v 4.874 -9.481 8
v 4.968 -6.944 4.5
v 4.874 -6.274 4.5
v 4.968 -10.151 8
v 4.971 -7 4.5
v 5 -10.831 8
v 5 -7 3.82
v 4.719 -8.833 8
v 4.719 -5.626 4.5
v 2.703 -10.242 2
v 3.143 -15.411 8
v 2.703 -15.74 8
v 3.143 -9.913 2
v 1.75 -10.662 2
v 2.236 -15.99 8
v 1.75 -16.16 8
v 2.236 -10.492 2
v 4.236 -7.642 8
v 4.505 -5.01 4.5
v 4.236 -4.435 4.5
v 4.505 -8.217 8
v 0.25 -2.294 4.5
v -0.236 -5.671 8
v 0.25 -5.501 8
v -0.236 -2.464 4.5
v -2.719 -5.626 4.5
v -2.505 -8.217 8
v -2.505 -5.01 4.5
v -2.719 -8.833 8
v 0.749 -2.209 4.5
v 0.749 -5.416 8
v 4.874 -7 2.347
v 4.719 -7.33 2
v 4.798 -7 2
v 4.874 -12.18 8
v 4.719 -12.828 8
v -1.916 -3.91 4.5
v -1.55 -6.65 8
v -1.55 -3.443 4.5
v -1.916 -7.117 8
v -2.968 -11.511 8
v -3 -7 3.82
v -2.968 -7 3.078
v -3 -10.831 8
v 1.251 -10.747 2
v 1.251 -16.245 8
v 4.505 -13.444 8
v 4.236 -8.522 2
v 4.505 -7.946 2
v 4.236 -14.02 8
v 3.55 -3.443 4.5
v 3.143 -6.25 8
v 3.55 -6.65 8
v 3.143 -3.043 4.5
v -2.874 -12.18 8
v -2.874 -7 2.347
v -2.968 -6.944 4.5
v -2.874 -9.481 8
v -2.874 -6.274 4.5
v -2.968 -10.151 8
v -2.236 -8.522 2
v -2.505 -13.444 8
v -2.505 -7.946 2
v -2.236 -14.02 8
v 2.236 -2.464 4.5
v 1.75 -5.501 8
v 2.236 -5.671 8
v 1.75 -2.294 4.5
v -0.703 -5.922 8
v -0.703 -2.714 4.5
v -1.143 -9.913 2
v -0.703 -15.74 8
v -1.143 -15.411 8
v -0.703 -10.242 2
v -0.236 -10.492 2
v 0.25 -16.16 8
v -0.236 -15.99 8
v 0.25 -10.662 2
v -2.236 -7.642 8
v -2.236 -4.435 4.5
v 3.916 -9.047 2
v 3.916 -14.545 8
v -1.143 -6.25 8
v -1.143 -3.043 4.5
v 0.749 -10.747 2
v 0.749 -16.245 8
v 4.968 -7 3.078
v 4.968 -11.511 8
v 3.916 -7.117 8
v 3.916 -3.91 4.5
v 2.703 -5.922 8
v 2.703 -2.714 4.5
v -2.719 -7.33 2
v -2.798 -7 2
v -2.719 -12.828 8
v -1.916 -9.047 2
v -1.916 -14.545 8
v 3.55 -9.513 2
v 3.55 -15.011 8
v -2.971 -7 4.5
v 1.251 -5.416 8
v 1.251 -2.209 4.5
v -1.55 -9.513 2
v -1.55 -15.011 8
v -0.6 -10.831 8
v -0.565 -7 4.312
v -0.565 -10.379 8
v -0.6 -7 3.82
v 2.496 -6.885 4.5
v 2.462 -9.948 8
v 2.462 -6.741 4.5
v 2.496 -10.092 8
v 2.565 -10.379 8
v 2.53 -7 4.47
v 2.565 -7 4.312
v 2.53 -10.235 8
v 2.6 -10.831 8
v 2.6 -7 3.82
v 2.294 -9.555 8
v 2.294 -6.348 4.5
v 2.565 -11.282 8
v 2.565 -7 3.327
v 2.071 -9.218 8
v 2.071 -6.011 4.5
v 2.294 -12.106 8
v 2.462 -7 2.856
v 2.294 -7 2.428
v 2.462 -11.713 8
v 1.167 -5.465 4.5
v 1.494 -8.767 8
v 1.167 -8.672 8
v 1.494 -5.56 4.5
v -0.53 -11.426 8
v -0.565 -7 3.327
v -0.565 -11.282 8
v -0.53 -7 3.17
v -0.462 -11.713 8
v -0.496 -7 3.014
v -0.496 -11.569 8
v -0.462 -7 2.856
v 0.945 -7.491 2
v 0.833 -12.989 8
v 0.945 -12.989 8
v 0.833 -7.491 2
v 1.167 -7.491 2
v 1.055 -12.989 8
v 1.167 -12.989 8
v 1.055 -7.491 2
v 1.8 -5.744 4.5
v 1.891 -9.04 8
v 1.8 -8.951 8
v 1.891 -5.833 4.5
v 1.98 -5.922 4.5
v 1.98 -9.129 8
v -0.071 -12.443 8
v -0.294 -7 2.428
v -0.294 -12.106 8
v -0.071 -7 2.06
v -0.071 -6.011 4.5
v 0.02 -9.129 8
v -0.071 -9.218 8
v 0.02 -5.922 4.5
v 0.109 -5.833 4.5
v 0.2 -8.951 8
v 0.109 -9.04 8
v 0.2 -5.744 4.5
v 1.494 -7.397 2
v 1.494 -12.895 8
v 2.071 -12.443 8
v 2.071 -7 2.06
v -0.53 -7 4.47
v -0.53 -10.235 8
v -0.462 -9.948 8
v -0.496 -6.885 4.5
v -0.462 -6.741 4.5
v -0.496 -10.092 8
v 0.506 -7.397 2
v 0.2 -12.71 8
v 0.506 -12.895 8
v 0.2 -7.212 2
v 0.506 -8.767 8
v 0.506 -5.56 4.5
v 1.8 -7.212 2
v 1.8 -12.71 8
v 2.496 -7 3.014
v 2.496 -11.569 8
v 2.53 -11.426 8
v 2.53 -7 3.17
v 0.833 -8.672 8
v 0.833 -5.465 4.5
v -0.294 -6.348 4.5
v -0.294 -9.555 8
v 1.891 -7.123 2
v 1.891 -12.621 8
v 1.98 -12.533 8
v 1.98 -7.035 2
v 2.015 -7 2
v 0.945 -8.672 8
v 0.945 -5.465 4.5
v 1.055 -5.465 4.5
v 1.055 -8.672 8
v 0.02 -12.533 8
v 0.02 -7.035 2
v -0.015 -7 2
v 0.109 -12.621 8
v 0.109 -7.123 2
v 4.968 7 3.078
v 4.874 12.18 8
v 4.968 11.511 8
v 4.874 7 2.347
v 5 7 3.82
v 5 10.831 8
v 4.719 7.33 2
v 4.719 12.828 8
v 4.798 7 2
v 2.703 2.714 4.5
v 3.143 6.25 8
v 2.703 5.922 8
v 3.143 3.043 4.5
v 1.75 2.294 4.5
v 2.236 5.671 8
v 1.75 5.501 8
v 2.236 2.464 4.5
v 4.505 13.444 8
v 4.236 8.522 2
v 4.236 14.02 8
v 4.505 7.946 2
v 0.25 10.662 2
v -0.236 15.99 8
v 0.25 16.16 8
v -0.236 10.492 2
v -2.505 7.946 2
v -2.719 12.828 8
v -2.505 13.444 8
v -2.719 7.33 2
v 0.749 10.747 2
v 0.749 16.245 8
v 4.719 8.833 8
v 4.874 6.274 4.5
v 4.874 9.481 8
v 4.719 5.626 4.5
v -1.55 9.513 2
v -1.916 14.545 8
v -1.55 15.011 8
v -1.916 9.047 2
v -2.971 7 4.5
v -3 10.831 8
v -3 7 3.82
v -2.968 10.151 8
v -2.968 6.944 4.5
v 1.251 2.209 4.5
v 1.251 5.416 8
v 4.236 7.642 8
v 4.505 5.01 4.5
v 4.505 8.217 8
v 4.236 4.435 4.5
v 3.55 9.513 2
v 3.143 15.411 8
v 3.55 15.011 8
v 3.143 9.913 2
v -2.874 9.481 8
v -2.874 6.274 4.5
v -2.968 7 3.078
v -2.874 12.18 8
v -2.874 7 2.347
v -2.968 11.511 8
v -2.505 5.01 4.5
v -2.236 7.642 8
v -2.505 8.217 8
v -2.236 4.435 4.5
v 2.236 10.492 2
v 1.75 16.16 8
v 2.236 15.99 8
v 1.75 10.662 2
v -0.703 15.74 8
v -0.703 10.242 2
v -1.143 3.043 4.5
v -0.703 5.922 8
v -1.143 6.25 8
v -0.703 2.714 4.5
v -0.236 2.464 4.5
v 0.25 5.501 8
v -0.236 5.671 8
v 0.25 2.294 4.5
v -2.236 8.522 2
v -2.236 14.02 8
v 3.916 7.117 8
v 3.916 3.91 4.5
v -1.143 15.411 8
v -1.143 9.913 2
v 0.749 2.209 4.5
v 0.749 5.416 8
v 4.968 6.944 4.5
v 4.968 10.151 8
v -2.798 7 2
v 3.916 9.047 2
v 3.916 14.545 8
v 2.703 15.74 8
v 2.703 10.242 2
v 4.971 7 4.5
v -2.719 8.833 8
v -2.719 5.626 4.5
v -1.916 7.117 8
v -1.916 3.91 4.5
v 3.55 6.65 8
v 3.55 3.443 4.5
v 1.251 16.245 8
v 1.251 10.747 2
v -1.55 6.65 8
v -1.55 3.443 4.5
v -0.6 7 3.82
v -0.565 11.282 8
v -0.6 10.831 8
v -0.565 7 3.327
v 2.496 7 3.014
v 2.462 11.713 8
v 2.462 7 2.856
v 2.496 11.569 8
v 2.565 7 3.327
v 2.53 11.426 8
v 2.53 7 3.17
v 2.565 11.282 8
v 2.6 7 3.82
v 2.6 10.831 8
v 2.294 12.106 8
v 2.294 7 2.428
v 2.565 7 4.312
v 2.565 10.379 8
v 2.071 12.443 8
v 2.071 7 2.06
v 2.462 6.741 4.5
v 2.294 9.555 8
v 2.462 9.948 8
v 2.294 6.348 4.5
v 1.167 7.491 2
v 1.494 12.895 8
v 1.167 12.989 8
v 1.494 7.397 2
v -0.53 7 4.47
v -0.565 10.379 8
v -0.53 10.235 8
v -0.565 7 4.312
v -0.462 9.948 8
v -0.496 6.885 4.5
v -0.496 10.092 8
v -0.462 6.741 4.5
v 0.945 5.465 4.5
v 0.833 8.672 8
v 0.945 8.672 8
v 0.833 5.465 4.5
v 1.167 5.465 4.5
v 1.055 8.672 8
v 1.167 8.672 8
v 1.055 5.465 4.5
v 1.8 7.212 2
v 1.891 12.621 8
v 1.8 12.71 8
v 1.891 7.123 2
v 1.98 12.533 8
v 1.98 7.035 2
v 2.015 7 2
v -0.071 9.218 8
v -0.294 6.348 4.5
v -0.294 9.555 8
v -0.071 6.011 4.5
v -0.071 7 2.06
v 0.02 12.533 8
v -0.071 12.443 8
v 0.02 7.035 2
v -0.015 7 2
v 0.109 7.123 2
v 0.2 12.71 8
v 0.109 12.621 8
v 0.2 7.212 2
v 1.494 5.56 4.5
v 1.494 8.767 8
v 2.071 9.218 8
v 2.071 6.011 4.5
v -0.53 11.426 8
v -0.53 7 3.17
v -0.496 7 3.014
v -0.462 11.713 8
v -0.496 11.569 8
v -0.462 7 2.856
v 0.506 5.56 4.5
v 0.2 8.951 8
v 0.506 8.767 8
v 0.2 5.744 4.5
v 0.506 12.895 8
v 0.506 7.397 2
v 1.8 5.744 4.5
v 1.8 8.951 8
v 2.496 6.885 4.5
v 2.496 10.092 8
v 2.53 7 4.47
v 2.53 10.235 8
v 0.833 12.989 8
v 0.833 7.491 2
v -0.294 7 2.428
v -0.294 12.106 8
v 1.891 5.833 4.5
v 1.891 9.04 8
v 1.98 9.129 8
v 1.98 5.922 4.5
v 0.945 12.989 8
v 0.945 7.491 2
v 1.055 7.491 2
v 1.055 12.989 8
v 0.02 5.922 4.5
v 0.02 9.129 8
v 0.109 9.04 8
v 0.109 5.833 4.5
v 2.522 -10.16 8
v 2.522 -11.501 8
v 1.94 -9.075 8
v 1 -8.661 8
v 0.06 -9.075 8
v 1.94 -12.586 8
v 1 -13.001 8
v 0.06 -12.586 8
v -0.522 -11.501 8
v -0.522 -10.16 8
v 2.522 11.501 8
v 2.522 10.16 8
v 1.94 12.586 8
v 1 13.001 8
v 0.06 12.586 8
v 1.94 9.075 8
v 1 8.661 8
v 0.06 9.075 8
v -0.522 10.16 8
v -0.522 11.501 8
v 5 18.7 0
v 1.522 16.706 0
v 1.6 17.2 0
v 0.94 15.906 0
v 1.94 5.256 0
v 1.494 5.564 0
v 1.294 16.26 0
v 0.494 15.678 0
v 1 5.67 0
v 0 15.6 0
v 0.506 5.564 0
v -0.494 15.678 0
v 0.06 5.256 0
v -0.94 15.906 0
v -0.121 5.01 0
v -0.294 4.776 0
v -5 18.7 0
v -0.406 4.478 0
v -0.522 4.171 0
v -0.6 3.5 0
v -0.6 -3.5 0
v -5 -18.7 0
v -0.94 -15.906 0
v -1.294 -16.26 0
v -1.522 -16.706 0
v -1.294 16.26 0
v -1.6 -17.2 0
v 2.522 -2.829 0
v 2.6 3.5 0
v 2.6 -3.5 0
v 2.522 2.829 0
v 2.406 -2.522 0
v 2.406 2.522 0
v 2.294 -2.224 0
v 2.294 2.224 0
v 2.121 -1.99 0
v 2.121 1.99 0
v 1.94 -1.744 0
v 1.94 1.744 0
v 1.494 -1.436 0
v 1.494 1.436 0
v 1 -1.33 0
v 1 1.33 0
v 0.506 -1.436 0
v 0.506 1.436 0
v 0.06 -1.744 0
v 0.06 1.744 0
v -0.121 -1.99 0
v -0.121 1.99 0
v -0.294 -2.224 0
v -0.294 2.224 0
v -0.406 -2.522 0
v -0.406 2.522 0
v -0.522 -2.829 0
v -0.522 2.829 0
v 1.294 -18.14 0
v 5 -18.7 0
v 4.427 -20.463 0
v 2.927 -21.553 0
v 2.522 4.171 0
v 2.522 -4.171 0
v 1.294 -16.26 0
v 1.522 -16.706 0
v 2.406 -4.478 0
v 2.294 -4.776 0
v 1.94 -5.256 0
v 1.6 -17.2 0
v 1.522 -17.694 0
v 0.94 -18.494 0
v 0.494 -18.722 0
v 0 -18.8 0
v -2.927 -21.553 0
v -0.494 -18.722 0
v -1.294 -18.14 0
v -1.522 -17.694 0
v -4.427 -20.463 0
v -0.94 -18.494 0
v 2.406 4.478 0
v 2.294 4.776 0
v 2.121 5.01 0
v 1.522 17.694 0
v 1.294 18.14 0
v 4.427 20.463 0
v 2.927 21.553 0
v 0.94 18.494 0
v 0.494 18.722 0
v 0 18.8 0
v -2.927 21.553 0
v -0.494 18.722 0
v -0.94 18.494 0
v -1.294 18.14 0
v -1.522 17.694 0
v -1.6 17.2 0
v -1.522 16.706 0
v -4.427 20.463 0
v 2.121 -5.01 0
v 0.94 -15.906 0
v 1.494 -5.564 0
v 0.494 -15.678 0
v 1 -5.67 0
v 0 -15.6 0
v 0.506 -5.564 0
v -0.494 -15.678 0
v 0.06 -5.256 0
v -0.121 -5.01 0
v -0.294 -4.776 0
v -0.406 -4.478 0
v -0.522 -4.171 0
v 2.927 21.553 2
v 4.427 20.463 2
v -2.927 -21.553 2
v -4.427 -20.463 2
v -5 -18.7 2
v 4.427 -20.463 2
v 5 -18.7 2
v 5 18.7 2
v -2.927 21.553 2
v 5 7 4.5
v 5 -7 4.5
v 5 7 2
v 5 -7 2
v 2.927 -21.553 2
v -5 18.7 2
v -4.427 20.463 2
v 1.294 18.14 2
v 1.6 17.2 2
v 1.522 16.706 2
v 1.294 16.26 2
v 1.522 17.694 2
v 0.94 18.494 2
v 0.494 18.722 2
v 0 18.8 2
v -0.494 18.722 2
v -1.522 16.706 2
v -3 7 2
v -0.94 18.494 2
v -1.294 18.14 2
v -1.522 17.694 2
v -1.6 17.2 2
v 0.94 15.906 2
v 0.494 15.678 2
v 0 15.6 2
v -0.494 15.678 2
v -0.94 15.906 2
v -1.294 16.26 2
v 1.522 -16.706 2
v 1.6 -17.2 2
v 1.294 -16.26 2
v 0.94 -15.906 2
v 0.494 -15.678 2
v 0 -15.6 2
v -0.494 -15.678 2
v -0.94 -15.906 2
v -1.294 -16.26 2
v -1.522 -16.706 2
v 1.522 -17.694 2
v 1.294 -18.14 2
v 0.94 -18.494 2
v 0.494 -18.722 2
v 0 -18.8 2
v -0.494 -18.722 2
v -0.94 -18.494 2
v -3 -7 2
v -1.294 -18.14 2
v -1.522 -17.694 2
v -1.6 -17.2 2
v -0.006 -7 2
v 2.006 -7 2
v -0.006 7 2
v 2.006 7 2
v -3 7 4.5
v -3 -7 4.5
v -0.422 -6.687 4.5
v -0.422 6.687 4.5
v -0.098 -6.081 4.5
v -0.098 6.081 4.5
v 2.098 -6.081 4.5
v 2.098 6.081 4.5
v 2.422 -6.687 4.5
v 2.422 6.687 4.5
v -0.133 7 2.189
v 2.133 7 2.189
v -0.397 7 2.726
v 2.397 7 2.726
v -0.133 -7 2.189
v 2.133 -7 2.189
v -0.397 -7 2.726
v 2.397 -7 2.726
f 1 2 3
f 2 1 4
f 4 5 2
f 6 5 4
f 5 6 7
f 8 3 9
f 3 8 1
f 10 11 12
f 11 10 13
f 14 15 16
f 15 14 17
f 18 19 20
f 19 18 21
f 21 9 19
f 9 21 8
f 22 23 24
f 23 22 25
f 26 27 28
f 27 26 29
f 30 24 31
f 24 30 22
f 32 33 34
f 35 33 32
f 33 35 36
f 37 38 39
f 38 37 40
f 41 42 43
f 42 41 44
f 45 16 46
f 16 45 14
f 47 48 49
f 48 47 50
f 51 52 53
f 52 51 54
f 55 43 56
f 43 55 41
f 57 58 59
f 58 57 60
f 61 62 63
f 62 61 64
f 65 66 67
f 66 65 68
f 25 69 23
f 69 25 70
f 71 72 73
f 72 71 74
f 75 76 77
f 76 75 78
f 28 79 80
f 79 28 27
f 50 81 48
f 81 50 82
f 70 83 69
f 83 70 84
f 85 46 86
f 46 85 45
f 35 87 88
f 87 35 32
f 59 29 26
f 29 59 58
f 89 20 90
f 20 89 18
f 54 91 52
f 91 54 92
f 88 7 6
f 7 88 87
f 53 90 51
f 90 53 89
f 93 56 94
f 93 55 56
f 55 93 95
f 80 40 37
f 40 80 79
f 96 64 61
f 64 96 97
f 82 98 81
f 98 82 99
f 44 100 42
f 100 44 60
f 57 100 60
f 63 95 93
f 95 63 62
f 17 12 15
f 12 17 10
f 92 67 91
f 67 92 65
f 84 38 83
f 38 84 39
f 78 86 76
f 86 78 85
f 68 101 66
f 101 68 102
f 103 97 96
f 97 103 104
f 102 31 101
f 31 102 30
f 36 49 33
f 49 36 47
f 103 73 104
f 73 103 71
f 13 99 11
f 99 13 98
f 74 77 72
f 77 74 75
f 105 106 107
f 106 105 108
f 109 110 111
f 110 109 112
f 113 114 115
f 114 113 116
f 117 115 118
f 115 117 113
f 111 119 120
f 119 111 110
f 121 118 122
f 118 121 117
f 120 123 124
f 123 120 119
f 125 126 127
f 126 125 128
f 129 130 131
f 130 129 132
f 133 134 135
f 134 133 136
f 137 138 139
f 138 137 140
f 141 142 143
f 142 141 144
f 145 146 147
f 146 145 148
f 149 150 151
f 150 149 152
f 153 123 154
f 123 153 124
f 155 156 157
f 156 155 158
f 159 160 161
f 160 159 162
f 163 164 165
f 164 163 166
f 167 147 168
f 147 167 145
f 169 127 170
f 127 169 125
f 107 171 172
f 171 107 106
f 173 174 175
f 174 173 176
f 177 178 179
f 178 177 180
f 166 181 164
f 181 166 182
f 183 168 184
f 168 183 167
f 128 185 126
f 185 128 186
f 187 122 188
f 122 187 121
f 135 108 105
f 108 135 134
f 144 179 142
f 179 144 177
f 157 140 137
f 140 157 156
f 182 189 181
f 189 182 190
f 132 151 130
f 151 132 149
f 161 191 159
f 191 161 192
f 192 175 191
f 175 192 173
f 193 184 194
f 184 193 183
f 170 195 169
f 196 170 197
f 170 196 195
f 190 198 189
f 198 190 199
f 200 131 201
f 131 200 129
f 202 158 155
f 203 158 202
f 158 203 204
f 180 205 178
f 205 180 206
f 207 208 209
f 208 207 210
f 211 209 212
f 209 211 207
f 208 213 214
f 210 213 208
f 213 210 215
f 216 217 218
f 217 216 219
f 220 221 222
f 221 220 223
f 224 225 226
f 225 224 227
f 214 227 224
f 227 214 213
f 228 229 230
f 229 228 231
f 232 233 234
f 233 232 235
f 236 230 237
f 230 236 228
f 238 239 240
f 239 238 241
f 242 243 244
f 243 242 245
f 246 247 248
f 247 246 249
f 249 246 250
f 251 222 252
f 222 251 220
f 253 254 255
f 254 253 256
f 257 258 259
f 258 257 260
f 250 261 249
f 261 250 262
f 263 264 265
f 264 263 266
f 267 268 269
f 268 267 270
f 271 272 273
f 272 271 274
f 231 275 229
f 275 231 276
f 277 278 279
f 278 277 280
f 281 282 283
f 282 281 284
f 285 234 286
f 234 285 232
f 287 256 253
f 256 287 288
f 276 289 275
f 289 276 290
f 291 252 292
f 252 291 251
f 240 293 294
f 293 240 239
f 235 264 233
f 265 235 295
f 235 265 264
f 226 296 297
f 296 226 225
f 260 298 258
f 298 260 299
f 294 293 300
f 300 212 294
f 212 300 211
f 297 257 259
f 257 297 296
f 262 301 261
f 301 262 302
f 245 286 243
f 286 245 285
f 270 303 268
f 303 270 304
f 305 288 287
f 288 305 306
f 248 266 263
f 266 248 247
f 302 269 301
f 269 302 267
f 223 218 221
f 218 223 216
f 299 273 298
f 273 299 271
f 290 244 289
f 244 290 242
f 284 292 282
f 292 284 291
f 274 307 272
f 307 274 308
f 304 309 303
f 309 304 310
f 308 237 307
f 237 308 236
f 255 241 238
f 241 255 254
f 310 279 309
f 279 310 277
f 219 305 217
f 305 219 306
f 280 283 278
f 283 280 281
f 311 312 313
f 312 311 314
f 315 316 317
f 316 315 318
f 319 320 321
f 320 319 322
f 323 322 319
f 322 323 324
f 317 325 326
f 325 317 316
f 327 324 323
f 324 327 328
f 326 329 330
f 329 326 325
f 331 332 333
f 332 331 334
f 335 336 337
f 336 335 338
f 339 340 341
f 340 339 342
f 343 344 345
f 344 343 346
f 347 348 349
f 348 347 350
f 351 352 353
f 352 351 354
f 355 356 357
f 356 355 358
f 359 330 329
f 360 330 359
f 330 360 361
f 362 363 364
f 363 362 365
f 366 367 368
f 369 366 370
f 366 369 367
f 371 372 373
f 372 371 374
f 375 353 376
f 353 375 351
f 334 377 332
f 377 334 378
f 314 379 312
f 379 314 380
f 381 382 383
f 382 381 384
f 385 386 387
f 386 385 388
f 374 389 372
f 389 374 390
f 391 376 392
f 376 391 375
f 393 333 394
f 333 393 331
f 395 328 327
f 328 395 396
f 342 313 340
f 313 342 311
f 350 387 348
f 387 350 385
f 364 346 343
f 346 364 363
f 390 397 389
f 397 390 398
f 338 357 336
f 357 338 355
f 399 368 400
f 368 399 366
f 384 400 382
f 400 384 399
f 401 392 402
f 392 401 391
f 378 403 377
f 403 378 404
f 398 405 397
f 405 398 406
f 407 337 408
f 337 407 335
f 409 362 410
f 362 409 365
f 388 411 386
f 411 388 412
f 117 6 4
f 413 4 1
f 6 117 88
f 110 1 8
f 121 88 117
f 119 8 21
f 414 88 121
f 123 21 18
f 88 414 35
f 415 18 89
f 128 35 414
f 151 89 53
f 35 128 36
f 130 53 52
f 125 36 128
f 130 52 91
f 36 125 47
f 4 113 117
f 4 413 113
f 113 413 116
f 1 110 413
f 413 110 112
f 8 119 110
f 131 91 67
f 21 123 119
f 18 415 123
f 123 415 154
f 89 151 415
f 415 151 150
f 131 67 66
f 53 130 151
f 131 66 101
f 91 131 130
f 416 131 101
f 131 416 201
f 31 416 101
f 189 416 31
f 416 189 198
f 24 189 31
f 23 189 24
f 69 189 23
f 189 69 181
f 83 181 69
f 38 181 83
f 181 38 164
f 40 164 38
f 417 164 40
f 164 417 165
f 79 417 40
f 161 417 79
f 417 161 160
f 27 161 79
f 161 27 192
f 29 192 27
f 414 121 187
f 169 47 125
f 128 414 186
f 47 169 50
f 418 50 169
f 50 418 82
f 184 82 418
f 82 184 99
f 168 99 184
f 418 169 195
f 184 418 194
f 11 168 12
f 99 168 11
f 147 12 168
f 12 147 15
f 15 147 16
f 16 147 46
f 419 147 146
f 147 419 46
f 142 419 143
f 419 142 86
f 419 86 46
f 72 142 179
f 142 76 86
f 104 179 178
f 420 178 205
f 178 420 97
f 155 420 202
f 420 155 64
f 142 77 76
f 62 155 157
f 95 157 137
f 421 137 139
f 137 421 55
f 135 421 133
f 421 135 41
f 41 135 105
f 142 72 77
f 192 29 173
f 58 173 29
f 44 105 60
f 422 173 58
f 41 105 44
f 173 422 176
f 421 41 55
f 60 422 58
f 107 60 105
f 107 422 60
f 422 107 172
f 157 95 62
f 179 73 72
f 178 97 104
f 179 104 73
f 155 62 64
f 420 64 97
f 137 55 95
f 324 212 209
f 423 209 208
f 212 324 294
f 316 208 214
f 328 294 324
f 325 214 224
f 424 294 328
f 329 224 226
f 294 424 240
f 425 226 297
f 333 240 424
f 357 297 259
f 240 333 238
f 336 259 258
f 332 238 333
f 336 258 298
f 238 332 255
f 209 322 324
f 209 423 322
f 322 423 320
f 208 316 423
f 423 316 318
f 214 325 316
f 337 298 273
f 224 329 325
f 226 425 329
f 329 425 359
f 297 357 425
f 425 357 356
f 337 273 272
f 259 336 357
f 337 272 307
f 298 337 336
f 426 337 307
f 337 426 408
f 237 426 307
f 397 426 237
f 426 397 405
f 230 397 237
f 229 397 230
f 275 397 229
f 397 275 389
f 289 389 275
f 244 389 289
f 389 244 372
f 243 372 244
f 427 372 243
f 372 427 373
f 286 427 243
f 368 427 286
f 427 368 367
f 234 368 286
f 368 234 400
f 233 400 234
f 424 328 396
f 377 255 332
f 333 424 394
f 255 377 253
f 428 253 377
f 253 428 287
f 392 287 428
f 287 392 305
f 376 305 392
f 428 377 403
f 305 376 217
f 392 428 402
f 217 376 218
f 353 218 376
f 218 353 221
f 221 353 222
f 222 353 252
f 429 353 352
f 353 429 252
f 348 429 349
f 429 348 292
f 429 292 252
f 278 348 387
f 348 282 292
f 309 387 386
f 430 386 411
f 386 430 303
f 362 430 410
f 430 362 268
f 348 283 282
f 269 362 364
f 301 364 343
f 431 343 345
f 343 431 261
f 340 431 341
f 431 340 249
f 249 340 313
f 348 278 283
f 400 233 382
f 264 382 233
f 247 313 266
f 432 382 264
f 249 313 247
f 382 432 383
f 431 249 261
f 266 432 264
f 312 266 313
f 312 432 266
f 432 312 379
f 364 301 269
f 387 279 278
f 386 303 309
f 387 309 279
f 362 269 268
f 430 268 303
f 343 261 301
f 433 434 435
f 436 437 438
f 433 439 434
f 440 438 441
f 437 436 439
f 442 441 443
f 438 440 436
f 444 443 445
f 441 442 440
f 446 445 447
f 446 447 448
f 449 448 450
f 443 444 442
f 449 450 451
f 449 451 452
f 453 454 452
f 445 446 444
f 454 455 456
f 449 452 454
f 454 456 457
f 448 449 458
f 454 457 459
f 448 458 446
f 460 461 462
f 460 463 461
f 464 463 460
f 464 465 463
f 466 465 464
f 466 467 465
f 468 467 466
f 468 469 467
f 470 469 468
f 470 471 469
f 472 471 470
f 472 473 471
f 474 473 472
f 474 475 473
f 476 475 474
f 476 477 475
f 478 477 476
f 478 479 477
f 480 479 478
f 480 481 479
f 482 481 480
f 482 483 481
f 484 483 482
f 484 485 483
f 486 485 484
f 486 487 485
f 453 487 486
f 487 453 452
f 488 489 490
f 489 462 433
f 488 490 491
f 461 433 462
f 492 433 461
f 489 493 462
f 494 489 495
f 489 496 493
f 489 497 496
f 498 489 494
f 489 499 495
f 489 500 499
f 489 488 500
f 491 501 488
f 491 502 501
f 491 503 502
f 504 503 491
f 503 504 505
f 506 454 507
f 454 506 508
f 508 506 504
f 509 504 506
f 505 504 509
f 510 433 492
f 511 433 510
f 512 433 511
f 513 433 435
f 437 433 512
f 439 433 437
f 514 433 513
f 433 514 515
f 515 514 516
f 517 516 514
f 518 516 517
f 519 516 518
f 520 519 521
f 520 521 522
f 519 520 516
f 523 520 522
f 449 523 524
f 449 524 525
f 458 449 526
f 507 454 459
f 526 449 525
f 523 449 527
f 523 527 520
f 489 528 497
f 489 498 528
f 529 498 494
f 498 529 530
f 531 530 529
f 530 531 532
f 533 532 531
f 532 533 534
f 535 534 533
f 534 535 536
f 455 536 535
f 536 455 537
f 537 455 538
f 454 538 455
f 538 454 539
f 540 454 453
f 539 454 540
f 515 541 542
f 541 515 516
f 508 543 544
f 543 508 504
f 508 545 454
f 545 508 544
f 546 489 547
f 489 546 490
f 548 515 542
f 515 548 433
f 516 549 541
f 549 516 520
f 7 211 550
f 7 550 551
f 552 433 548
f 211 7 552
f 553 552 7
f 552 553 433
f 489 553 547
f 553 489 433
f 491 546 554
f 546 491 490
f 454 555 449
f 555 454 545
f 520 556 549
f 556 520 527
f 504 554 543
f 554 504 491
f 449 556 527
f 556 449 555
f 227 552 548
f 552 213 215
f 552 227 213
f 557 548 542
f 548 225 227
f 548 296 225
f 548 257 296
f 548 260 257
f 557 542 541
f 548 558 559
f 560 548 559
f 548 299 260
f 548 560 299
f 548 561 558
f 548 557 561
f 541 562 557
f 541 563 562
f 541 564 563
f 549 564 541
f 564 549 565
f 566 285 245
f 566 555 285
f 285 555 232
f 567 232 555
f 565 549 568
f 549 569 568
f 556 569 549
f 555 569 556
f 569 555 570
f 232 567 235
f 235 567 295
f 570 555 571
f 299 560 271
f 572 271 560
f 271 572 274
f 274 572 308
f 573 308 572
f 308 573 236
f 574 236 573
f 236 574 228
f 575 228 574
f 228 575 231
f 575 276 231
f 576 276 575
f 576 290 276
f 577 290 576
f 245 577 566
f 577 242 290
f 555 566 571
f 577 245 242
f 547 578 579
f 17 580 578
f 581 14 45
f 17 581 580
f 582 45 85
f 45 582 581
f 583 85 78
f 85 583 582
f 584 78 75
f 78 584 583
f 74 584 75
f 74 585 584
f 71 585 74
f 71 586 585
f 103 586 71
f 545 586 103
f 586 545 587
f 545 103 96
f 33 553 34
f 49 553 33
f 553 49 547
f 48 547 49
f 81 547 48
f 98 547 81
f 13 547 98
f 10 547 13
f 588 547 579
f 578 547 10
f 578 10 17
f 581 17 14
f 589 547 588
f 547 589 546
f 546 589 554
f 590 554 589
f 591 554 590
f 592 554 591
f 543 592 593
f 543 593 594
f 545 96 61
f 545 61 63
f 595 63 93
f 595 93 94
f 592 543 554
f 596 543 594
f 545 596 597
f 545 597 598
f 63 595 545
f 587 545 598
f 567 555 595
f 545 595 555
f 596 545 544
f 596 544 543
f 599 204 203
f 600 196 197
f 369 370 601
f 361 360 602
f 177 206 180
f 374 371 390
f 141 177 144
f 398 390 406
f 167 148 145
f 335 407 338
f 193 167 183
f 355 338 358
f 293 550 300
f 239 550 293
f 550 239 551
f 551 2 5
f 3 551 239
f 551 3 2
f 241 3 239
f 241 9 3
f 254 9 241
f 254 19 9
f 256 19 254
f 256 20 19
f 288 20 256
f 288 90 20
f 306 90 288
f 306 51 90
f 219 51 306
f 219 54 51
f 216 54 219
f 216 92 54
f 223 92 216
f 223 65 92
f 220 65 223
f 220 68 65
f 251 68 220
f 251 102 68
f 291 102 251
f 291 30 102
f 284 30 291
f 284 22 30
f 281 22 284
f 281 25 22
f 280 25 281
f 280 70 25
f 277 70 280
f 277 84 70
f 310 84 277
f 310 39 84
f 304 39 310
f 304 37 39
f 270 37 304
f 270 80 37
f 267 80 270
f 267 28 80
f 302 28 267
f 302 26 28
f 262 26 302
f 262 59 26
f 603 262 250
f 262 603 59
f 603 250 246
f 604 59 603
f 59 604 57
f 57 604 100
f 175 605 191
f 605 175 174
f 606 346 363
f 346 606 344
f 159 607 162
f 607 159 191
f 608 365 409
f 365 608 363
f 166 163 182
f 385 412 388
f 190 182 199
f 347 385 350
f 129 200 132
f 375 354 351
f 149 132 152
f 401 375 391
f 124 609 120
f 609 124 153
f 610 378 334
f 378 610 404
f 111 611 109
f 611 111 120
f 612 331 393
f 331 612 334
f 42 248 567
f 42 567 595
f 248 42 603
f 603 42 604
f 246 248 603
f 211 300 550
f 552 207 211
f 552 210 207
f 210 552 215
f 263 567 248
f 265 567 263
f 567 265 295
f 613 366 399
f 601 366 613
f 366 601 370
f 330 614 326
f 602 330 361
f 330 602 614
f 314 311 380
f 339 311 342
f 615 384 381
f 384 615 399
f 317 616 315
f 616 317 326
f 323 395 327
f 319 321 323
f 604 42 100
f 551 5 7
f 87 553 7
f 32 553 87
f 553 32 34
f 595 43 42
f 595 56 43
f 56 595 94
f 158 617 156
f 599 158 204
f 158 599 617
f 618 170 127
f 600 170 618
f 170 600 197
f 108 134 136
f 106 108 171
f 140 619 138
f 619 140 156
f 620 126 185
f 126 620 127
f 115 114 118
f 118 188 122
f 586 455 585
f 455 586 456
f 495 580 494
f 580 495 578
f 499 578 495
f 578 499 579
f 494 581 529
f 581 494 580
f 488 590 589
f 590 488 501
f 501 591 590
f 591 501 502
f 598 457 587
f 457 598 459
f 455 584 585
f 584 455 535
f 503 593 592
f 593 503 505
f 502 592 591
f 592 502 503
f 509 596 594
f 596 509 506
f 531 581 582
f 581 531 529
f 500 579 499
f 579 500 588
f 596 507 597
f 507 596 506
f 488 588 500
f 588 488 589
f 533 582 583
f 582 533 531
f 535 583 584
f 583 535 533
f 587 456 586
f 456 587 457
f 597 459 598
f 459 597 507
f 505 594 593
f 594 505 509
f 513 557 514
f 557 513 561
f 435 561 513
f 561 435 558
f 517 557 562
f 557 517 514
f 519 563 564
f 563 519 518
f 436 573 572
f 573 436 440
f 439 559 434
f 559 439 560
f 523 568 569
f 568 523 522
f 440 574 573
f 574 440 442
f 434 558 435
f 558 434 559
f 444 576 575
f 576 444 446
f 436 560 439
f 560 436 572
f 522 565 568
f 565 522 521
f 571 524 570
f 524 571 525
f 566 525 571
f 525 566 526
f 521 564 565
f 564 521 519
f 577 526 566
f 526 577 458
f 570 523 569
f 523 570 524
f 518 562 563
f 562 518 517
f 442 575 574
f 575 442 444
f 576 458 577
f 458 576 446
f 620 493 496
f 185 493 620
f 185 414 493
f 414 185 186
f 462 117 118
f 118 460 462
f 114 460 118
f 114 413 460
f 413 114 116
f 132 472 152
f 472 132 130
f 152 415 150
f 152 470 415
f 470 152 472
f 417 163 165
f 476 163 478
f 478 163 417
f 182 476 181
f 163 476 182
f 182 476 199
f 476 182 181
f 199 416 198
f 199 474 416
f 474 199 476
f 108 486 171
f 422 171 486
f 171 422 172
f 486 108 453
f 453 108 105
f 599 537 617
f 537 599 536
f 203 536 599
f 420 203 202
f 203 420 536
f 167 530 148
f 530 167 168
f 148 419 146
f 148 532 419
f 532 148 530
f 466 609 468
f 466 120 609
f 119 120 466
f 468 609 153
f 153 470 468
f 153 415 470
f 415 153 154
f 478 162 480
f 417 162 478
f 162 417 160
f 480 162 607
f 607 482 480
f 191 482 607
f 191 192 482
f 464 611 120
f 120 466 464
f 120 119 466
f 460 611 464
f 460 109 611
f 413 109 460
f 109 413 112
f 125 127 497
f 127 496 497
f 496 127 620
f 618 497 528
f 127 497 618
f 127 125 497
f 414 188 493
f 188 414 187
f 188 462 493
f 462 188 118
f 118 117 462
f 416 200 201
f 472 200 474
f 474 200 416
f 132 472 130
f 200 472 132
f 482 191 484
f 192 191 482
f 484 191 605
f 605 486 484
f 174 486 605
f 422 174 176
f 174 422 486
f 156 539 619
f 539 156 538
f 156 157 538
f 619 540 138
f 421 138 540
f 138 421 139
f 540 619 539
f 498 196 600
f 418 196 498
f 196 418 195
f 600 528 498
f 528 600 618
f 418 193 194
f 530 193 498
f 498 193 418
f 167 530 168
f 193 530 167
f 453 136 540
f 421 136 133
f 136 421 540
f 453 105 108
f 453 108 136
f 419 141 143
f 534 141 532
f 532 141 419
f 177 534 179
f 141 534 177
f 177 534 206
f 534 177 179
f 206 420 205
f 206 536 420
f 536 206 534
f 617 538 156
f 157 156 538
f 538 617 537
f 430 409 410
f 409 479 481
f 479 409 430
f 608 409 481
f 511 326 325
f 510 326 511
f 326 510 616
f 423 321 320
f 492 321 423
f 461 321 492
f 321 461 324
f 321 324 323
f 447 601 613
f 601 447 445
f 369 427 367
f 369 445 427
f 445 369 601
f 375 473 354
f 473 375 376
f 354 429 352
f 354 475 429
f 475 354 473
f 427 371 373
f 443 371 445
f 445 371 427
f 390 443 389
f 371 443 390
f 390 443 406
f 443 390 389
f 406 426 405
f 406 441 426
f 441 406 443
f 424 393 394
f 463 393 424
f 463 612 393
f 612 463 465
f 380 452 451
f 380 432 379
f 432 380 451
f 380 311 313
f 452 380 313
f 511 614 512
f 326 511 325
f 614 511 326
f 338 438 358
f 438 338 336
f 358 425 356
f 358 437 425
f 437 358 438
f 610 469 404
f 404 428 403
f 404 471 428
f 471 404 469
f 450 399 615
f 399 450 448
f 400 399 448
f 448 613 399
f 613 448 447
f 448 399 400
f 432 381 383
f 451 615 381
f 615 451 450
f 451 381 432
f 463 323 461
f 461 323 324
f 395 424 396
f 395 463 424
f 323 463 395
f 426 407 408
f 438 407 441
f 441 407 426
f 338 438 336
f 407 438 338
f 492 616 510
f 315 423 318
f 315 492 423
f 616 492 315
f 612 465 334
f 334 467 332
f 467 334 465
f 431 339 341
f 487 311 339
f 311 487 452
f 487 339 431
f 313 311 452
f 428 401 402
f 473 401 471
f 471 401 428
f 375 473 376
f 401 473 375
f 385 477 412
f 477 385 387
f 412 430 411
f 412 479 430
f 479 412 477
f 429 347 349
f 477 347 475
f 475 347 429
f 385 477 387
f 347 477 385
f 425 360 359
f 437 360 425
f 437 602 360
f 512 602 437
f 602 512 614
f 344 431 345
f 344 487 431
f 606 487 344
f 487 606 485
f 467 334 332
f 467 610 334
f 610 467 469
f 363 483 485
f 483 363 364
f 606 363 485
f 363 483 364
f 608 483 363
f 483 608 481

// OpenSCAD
// file: dronePlates.scad
/**
 * dronePlates.scad
 * Plate library
 *
 * GNU GPL V3
 * @author: Victor Potenciano
 */

m3Rad = 3.4/2;
cornerR = 4;

/**
 *
 */
module helperDisk(diameter) {
	cylinder(r = diameter/2, h = 0.6, $fn=20);
}

/**
 *
 */
module roundedRect(size, radius) {
	x = size[0];
	y = size[1];
	z = size[2];

	linear_extrude(height=z)
	hull() {
	// place 4 circles in the corners, with the given radius
	translate([(-x/2)+(radius/2), (-y/2)+(radius/2), 0]){ circle(r=radius); }
	translate([(x/2)-(radius/2), (-y/2)+(radius/2), 0]){ circle(r=radius); }
	translate([(-x/2)+(radius/2), (y/2)-(radius/2), 0]){ circle(r=radius); }
	translate([(x/2)-(radius/2), (y/2)-(radius/2), 0]){ circle(r=radius); }
	}
}

/**
 * rounded rectangle triangle with corner at origin
 */
module roundedTriangle(size, radius) {
	x = size[0];
	y = size[1];
	z = size[2];

	linear_extrude(height=z)
	hull() {
	translate([radius, radius, 0]){ circle(r=radius); }
	translate([x-radius, radius, 0]){ circle(r=radius); }
	translate([radius, y-radius, 0]){ circle(r=radius); }
	}
}

/**
 *
 */
module roundRectPlate(w, l, plateThick=3) {
	difference(){
		roundedRect([l+m3Rad*1.75,w+m3Rad*1.75,plateThick], cornerR);
		translate([l/2, w/2, -0.5]) { cylinder(h = plateThick+1, r = m3Rad, $fn=30); }
		translate([-l/2, w/2, -0.5]) { cylinder(h = plateThick+1, r = m3Rad, $fn=30); }
		translate([l/2, -w/2, -0.5]) { cylinder(h = plateThick+1, r = m3Rad, $fn=30); }
		translate([-l/2, -w/2, -0.5]) { cylinder(h = plateThick+1, r = m3Rad, $fn=30); }
	}
}

/**
 *
 */
module crossSquarePlate(l, thick=3) {
	inDist = cornerR*2+4;
	trianL = sqrt((l*l)/2)-inDist;
	centerR = 4;

	difference(){
		roundRectPlate(l, l, thick);
		translate([0, centerR, -0.5]) { 
			rotate([0,0,45]){ roundedTriangle([trianL,trianL,thick+1], cornerR-2); }
		}
		translate([0, -centerR, -0.5]) { 
			rotate([0,0,225]){ roundedTriangle([trianL,trianL,thick+1], cornerR-2); }
		}
		translate([-centerR, 0, -0.5]) { 
			rotate([0,0,135]){ roundedTriangle([trianL,trianL,thick+1], cornerR-2); }
		}
		translate([centerR, 0, -0.5]) { 
			rotate([0,0,-45]){ roundedTriangle([trianL,trianL,thick+1], cornerR-2); }
		}
	}
}

/**
 *
 */
module hShapePlate(w, l, thick=4) {
	inDist = cornerR*2+1;

	difference(){
		roundRectPlate(w, l, thick);
		translate([0, w/4, -0.5]) { roundedRect([l-inDist,w/2-inDist,thick+1], cornerR-2); }
		translate([0, -w/4, -0.5]) { roundedRect([l-inDist,w/2-inDist,thick+1], cornerR-2); }
	}
}

/**
 *
 */
module motorCircleMount(inDia, outDia, thick=3, extraH=false, d1=19, d2=16, holeR=m3Rad ) {
	difference(){
		cylinder(h = thick, r = outDia/2, $fn=30);
		motorCircleMountHoles(inDia, outDia, thick, extraH, d1=d1, d2=d2, holeR=holeR);
	}
}

/**
 *
 */
module motorCircleMountHoles(inDia, outDia, thick=3, extraH=false, d1=19, d2=16, d3=25, holeR=m3Rad) {
	translate([0, 0, -0.5]) { cylinder(h = thick+1, r = inDia/2, $fn=30); }

	for(i=[0:3]) {
		rotate([0,0,90*i]){
		translate([d1/2, 0, -0.5]) cylinder(h = thick+1, r = holeR, $fn=20);
		translate([d2/2, 0, -0.5]) cylinder(h = thick+1, r = holeR, $fn=20);
		translate([d2/2, -holeR, -0.5]) cube(size = [(d1-d2)/2,holeR*2,thick+1]);
		}
	}
	
	if(extraH==true){	
		for(i=[-1,1]) translate([i*d3/2, 0, -0.5]) { cylinder(h = thick+1, r = holeR, $fn=30); }
	}
}

/**
 *
 */
module motorRectMount(w, l, inDia, thick=3) {
	d1=19;
	d2=16;

	difference(){
		roundRectPlate(w, l, thick);
		translate([0, 0, -0.5]) { cylinder(h = thick+1, r = inDia/2, $fn=30); }
		translate([0, d1/2, -0.5]) { cylinder(h = thick+1, r = m3Rad, $fn=30); }
		translate([0, -d1/2, -0.5]) { cylinder(h = thick+1, r = m3Rad, $fn=30); }
		translate([d2/2, 0, -0.5]) { cylinder(h = thick+1, r = m3Rad, $fn=30); }
		translate([-d2/2, 0, -0.5]) { cylinder(h = thick+1, r = m3Rad, $fn=30); }
	}
}

/**
 *
 */
module tube(inDia, outDia, height) {
	difference(){
		cylinder(h = height, r = outDia/2, $fn=50);
		translate([0, 0, -0.5]) { cylinder(h = height+1, r = inDia/2, $fn=30); }
	}
}

/**
 *
 */
module squareTube(inDia, outDia, height) {
	translate([0,0,height/2]){
	difference(){
		cube(size = [outDia,outDia,height], center = true);
		cube(size = [inDia,inDia,height+1], center = true);
	}
	}
}

/**
 *
 */
module djiFlamewheelHoles(height) {
	a = 23;
	b = 16;
	c = 19.5;
	
	translate([a/2, c/2, 0]) { cylinder(h = height, r = m3Rad, $fn=30); }
	translate([-a/2, c/2, 0]) { cylinder(h = height, r = m3Rad, $fn=30); }
	translate([b/2, -c/2, 0]) { cylinder(h = height, r = m3Rad, $fn=30); }
	translate([-b/2, -c/2, 0]) { cylinder(h = height, r = m3Rad, $fn=30); }
}

/**
 *
 */
module djiFlamewheelHolesBotton(height) {
	a1 = 21;
	c = 19.5;
	
	translate([a1/2, c/2, 0]) { cylinder(h = height, r = m3Rad, $fn=30); }
	translate([-a1/2, c/2, 0]) { cylinder(h = height, r = m3Rad, $fn=30); }
}

/**
 *
 */
module propeller(size){
union(){
difference(){
	cylinder(h = 3, r = size/2, center=true, $fn=30);
	cylinder(h = 3.1, r = size/2-2, center=true, $fn=30); 
}
for( i = [-1,1] ){
rotate([0,0,45*i]){ cube(size = [size,4,1], center = true); }
}
}
}

/**
 *
 */
module slot(length, height, rad){
for(i=[-1,1]) translate([i*length/2,0,0]) cylinder(h = height, r = rad, $fn=30);
translate([0,0,height/2]) cube(size = [length,rad*2,height], center = true);
}

 

////////////////////////
// Examples:
////////////////////////

motorCircleMount(8, 25, 3.5);

//roundedRect([50,50,3], 4);

//hShapePlate(79, 25);

//rotate([0,0,45]){roundedTriangle([40,40,3], 4);}

//crossSquarePlate(45, 4);

/*
union(){
motorRectMount(21, 18, 8, 4);
translate([9, 10.5, 0]) {tube(m3Rad*2, 6.5, 6);}
}
*/

/*
difference(){
union(){
hShapePlate(50, 30, 3.5);
translate([-4,-25,0]){cube(size = [8,50,3.5]);}
rotate([0, 0, 45]) {motorCircleMount(8, 35, 3.5);}
}
cylinder(h = 10, r = 4, $fn=100, center=true);
}
*/

//rotate([90,0,0]){ tube(5,10,20); }
//translate([20,0,0]){ squareTube(5, 10, 20); }
// main file
/**
 * zmr250 antenna mount
 */
 
use <dronePlates.scad>;

holeDist = 34.4;
m3Rad = 3.2/2;
thick = 2;
angle2 = 85;
antDist = 7;
holeAntShift =1 ;

difference(){
    union(){
        roundedRect([7,holeDist+6,thick],3);
        translate([-8/2+1,-14/2,0]) cube(size=[8,14,thick+2.5]);
        
        //antenna holder
        difference(){

        for(i=[-1,1]){
        translate([holeAntShift,i*antDist/2,0]) rotate([-i*angle2/2,0,0]) tube(m3Rad*2, 8, 18);
        }

        translate([holeAntShift,0,-10/2]) cube(size=[100,100,10], center=true);
        for(i=[-1,1]){
        translate([holeAntShift,i*antDist/2,10/2+8]) cube(size=[20,40,10], center=true);
        }

        }//diff
    }
    
    for(i=[-1,1]){
        translate([0,i*holeDist/2,-0.5]) cylinder(r=m3Rad, h=thick+1, $fn=20);
    }
    
    for(i=[-1,1]){
    translate([holeAntShift,i*antDist/2,0]) rotate([-i*angle2/2,0,0]) cylinder(r=m3Rad, h=90, $fn=20,center=true);
    }
}
